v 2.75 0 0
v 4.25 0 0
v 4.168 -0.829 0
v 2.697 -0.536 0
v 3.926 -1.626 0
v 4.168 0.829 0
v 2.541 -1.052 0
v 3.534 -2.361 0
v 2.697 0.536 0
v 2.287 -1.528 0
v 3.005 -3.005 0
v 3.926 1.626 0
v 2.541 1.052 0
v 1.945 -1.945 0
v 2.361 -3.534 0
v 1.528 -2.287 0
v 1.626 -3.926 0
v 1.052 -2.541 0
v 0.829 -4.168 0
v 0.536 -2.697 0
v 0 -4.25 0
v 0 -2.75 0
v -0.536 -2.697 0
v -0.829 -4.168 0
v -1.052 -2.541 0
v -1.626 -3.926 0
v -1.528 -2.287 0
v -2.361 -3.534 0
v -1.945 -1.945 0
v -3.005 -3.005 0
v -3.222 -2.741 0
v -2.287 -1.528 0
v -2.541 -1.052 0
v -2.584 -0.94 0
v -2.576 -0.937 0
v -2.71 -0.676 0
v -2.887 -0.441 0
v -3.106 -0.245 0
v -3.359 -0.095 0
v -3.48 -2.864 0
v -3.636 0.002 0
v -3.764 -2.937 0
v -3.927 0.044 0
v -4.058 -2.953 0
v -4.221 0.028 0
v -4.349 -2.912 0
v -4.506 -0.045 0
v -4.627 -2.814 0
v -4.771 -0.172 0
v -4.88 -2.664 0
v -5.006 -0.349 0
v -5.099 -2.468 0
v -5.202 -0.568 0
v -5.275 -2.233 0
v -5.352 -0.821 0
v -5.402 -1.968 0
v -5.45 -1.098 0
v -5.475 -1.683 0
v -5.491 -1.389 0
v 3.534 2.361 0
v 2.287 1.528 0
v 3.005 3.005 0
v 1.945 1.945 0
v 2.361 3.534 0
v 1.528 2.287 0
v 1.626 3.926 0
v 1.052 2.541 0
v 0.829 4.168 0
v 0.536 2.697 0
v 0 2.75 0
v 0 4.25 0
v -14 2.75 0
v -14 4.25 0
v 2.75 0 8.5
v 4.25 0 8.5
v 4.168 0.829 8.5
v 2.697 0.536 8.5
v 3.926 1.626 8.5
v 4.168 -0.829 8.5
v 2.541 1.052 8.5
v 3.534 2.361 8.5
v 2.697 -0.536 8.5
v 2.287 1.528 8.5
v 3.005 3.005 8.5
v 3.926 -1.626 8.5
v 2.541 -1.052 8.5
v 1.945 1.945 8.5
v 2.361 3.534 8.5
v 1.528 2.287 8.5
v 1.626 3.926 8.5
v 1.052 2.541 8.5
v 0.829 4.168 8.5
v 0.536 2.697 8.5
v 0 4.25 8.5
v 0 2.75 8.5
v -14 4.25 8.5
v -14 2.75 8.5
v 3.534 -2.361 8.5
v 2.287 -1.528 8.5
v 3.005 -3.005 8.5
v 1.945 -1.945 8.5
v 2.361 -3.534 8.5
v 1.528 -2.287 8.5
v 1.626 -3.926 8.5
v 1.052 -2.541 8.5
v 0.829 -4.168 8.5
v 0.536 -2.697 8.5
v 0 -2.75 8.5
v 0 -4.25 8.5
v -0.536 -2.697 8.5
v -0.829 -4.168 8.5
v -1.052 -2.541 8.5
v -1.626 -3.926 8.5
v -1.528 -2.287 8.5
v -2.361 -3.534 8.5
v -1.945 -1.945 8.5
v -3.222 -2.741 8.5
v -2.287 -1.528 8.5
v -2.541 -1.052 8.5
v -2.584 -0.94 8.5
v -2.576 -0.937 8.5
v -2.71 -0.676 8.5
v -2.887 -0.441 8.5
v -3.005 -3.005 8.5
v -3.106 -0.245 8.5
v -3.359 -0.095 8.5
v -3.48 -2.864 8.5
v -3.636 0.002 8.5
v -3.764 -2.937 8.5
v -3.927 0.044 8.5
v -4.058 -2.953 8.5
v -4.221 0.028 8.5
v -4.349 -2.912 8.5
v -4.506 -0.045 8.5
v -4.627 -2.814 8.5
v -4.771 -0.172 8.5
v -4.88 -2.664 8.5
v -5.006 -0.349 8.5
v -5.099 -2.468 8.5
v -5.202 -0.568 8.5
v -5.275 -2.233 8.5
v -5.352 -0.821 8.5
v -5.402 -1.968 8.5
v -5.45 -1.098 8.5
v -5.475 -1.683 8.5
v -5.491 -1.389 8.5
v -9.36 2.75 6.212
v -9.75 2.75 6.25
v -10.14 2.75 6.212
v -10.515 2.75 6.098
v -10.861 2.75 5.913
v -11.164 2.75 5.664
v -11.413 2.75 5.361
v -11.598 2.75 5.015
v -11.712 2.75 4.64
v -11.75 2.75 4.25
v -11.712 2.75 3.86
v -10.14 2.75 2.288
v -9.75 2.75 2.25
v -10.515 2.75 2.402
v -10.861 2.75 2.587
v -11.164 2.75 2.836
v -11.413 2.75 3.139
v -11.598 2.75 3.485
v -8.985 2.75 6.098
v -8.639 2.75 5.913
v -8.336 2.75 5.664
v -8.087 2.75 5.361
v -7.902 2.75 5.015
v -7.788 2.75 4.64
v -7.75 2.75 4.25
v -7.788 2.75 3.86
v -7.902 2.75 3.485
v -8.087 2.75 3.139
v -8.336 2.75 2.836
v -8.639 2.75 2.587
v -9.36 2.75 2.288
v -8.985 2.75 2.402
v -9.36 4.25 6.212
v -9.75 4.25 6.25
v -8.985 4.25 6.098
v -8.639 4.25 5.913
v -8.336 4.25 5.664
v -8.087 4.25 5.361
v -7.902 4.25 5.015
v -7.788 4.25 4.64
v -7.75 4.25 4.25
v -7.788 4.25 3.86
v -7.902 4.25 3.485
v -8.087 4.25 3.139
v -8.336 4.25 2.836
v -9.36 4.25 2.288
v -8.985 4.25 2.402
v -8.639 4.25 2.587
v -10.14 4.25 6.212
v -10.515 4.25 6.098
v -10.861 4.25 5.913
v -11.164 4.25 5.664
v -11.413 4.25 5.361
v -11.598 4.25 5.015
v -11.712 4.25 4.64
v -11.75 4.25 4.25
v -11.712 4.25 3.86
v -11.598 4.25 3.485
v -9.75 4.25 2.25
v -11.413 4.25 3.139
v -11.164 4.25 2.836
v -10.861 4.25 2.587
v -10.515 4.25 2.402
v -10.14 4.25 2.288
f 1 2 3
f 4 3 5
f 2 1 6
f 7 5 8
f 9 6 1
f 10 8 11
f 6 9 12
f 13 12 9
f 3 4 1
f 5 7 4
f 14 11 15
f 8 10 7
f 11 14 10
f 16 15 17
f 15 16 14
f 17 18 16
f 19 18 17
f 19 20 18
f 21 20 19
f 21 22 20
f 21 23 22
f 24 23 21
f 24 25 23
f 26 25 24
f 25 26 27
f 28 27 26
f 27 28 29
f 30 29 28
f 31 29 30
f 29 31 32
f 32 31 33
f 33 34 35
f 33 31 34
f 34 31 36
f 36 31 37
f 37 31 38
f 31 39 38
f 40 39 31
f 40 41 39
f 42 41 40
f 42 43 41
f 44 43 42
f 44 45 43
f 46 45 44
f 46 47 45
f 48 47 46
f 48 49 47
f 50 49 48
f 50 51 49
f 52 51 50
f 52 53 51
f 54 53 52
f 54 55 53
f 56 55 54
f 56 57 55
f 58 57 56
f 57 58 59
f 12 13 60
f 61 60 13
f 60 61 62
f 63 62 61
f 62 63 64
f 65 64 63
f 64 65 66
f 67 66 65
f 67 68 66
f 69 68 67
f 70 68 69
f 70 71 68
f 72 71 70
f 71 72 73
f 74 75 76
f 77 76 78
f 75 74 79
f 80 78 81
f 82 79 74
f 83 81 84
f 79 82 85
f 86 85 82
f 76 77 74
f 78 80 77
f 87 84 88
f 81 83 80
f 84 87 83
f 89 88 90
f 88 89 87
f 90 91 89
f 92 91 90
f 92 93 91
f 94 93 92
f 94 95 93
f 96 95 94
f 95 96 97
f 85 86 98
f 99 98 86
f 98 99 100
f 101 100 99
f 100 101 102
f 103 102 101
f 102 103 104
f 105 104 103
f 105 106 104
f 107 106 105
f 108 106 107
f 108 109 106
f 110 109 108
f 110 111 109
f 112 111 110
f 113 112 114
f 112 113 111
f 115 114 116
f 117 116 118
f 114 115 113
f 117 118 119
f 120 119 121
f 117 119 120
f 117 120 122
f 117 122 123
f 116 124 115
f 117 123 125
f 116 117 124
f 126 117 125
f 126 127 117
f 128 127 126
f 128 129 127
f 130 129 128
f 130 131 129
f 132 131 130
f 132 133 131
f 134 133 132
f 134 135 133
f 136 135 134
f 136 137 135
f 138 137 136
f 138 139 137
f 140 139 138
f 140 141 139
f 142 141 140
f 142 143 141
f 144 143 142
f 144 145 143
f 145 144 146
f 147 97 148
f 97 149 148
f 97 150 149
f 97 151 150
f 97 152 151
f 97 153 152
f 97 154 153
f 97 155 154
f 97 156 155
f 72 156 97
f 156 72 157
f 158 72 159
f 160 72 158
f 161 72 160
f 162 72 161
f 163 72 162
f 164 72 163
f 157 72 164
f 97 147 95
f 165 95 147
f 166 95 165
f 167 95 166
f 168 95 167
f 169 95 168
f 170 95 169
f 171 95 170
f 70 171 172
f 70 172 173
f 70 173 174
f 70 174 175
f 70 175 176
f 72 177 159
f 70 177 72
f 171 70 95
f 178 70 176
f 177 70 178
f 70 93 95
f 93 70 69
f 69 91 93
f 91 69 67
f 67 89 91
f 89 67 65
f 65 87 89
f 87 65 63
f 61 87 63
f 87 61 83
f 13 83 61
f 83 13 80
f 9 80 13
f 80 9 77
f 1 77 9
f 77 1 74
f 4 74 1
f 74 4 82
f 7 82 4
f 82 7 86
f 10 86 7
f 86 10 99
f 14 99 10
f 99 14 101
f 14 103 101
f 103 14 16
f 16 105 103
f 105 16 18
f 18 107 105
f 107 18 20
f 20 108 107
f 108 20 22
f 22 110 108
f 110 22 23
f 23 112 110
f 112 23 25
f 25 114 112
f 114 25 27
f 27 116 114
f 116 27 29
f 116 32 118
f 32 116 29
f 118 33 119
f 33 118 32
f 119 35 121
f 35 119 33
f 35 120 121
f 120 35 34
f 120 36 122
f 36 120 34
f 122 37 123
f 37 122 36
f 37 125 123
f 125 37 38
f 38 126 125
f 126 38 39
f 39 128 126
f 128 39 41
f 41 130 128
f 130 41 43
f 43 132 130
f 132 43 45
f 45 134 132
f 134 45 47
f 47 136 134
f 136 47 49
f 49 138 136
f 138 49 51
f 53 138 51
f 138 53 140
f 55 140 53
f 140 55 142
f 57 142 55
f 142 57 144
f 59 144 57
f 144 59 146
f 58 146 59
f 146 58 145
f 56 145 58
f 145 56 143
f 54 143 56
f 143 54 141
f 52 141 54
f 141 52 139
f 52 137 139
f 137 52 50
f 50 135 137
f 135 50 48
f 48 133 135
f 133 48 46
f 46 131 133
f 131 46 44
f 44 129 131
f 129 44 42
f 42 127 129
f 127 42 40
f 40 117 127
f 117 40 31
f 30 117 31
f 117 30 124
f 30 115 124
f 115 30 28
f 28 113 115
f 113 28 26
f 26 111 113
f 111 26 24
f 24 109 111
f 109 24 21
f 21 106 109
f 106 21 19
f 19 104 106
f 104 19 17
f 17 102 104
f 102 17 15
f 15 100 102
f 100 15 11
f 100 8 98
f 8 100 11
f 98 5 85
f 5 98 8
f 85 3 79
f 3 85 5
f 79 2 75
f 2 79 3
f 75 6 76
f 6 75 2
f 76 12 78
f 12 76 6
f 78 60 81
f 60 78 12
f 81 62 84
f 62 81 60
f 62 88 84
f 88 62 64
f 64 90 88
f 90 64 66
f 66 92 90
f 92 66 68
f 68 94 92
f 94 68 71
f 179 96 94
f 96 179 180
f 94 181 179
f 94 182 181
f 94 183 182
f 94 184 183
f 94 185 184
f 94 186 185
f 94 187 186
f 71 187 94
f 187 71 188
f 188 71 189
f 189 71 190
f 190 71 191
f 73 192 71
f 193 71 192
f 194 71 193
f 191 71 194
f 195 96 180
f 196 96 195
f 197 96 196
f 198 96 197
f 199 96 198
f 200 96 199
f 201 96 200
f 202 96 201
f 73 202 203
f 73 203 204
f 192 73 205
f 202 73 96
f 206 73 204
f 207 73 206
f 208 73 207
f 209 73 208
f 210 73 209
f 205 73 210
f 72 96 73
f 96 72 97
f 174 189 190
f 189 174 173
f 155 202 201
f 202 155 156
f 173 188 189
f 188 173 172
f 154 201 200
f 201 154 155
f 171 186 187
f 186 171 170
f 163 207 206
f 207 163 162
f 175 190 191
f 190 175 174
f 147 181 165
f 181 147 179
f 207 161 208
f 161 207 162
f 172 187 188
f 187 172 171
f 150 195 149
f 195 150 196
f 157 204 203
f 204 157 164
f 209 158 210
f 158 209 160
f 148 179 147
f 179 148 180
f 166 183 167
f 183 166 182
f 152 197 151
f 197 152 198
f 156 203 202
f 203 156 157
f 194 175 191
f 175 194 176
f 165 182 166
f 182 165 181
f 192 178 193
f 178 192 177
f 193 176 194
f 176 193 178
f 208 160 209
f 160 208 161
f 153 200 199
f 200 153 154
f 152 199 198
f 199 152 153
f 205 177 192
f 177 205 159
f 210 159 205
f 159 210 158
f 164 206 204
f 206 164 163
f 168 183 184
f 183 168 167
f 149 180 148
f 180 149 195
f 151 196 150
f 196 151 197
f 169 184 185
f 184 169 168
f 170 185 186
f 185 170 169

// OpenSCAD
part = "flap"; // [rod:Double clip,twisted:Twisted double clip (may require support for printing),flap:Open clip with flap,cross_flap:Open clip with flap crossed,single:Single clip,demo:Demo]

thickness = 1.5; // [0.2:0.1:10]
// Clip inner diameter
cable_diameter = 5.5; // [2:0.5:100]
opening_angle = 110; // [0:179]
// Second clip inner diameter for Double clips, set to 0 to disable
rod_diameter = 7.5; // [0:0.5:100]
screw_diameter = 4; // [0:0.5:20]
// This is set to 0 by default for faster preview. Set to e.g. 0.25 before rendering for smooth edges.
chamfer = 0; // [0:0.05:2]
// Twist angle for Twisted double clip
twist_angle = 90; // [-90:90]

/* [More settings] */

// Clip height, 0 for auto
height = 0; // [0:100]
// Position of the screw hole in the flap from cable center, 0 for auto
screw_position = 0; // [0:100]
// Length of the flap from cable center, 0 for auto
flap_length = 0; // [0:100]
// 0 for auto
opening_rounding_radius = 0; // [0:0.2:50]
// Cut the ledges of the twisted clip so it adheres to the platform
twisted_clip_cut = "auto"; // [auto,no]

/* [Hidden] */

$fn=32;

real_opening_rounding_radius = (opening_rounding_radius==0?thickness:max(opening_rounding_radius,thickness/2));
real_height = (part=="flap"?max(height,screw_diameter*2,cable_diameter+2*thickness):(height==0?(part=="cross_flap"?cable_diameter:max(cable_diameter,rod_diameter))+2*thickness:height));
real_screw_position = part=="cross_flap"?max(screw_position,cable_diameter/2+thickness+screw_diameter):max(screw_position,cable_diameter/2+real_opening_rounding_radius*2+screw_diameter);
real_flap_length = part=="cross_flap"?max(flap_length,real_screw_position+cable_diameter/2+thickness):max(flap_length,real_screw_position+real_height/2);

echo(str("Rounding radius: ",real_opening_rounding_radius));
echo(str("Height: ",real_height));
echo(str("Screw position: ",real_screw_position));
echo(str("Flap length: ",real_flap_length));

module ring(dia,thickness,angle,chamfer)
{
    difference() {
        circle(d=dia+2*thickness-2*chamfer);
        if (dia>0)
            circle(d=dia+2*chamfer);
        l=dia/2+thickness+1;
        if (angle < 180) {
            polygon([[0,0],[0,l],[-l,l],[-l,0],[-l,-l*tan(angle-90)]]);
        } else {
            polygon([[0,0],[0,l],[-l,l],[-l,0],[-l,-l],[l,-l],[l,l*tan(angle-90)]]);
        }
    }
}

module flap_clip()
{
    module section()
    {
        ring(cable_diameter,thickness,opening_angle,chamfer);
    
        dist=cable_diameter/2+real_opening_rounding_radius;
        translate([.001,-.001])
            rotate(opening_angle)
                translate([0,dist])
                    circle(r=real_opening_rounding_radius-chamfer);
    
        translate([-real_flap_length+chamfer,cable_diameter/2+chamfer])
            square([real_flap_length-chamfer,thickness-2*chamfer]);
    }

    difference() {
        translate([0,0,chamfer])
            linear_extrude(real_height-2*chamfer)
                section();

        translate([-real_screw_position,cable_diameter/2-1,real_height/2])
            rotate([-90])
                cylinder(d=screw_diameter+2*chamfer,h=thickness+2);
    }
}

module cross_flap_clip()
{
    module section()
    {
        rotate(-90-opening_angle/2)
            ring(cable_diameter,thickness,opening_angle,chamfer);
    
        dist=cable_diameter/2+real_opening_rounding_radius;
        for (mm=[0,1]) {
            mirror([0,mm,0])
                translate([-.001,-.001])
                    rotate(-opening_angle/2)
                        translate([dist,0])
                            circle(r=real_opening_rounding_radius-chamfer);
        }
    }

    translate([0,0,chamfer]) {
        linear_extrude(real_height-2*chamfer)
            section();
            
        linear_extrude(thickness) {
            difference() {
                translate([-(real_flap_length-cable_diameter/2-thickness-chamfer),0]) {
                    difference() {
                        union() {
                            translate([0,-cable_diameter/2-thickness+chamfer])
                                square([real_flap_length-cable_diameter/2-thickness-chamfer,cable_diameter+2*thickness-2*chamfer]);
                            circle(d=cable_diameter+2*thickness-2*chamfer);
                        }

                        circle(d=screw_diameter+2*chamfer);
                    }
                }

                circle(d=cable_diameter+2*chamfer);
            }
        }
    }
}

module single_clip()
{
    module section()
    {
        rotate(-90-opening_angle/2)
            ring(cable_diameter,thickness,opening_angle,chamfer);

        dist=cable_diameter/2+real_opening_rounding_radius;
        for (mm=[0,1]) {
            mirror([0,mm,0])
                translate([-.001,-.001])
                    rotate(-opening_angle/2)
                        translate([dist,0])
                            circle(r=real_opening_rounding_radius-chamfer);
        }
    }

    translate([0,0,chamfer])
        linear_extrude(real_height-2*chamfer)
            section();
}

module twisted_clip(angle=twist_angle)
{
    real_twisted_clip_cut = twisted_clip_cut=="auto"?(angle>45?false:true):false;

    module section(dia)
    {
        rotate(-90-opening_angle/2)
            ring(dia,thickness,opening_angle,chamfer);
    
        dist=dia/2+real_opening_rounding_radius;
        for (mm=[0,1]) {
            mirror([0,mm,0])
                translate([-.001,-.001])
                    rotate(-opening_angle/2)
                        translate([dist,0])
                            circle(r=real_opening_rounding_radius-chamfer);
        }
    }

    intersection() {
        union() {
            dist=cable_diameter/2+thickness+rod_diameter/2;
            
            linear_extrude(real_height)
                section(rod_diameter>cable_diameter?rod_diameter:cable_diameter);
            if (rod_diameter && cable_diameter)
                translate([0,0,real_height/2])
                    rotate([angle,0,0])
                        linear_extrude(real_height,center=true)
                            rotate(180)
                                translate([dist,0])
                                    section(rod_diameter>cable_diameter?cable_diameter:rod_diameter);
        }
        if (real_twisted_clip_cut)
            cylinder(d=4*rod_diameter+4*cable_diameter,h=real_height);
    }
}

module rod_clip()
{
    module section()
    {
        dist=cable_diameter/2+thickness+rod_diameter/2;
        
        rotate(90-opening_angle) {
            ring(cable_diameter,thickness,opening_angle,chamfer);
            translate([.001,cable_diameter/2+real_opening_rounding_radius-.001])
                circle(r=real_opening_rounding_radius-chamfer);
        }
        if (rod_diameter) {
            translate([-dist,-.001]) {
                rotate(270-opening_angle) {
                    ring(rod_diameter,thickness,opening_angle,chamfer);
                    translate([.001,rod_diameter/2+real_opening_rounding_radius-.001])
                        circle(r=real_opening_rounding_radius-chamfer);
                }
            }
        } else {
            translate([-cable_diameter/2-real_opening_rounding_radius,0])
                circle(r=real_opening_rounding_radius-chamfer);
        }
    }
    
    translate([0,0,chamfer])
        linear_extrude(real_height-2*chamfer)
            section();
}

module chamfer_chisel()
{
    cylinder(r1=chamfer,r2=0,h=chamfer,$fn=8);
    mirror([0,0,1])
        cylinder(r1=chamfer,r2=0,h=chamfer,$fn=8);
}

module part(part,arg1)
{
    module unchamfered() {
        if (part == "flap")
            flap_clip();
        else if (part == "rod")
            rod_clip();
        else if (part == "cross_flap")
            cross_flap_clip();
        else if (part == "single")
            single_clip();
        else
            twisted_clip(arg1?arg1:twist_angle);
    }

    if (chamfer > 0) {
        minkowski() {
            unchamfered();
            chamfer_chisel();            
        }
    } else {
        // Avoid minkowski() for speedup
        unchamfered();
    }
}

module demo()
{
    dist = (max(rod_diameter,cable_diameter)/2+thickness+2.5)*5/6;
    color([90/255,150/255,200/255])
        render()
            translate([dist,dist,0])
                rotate(180)
                    part("twisted",-30);
    color([70/255,130/255,180/255]) // steelblue
        render()
            translate([dist,-dist*4/3,0])
                mirror([1,0,0])
                    part("flap");
    color([255/255,140/255,0/255]) // darkorange
        render()
            translate([-dist,-2*dist,0])
                part("rod");
    color([255/255,160/255,20/255])
        render()
            translate([-dist,dist/3,0])
                part("cross_flap");
}

if (part == "demo") {
    demo();
} else if (part == "hires") {
    $fn=256;
    demo();
} else {
    part(part);
}
